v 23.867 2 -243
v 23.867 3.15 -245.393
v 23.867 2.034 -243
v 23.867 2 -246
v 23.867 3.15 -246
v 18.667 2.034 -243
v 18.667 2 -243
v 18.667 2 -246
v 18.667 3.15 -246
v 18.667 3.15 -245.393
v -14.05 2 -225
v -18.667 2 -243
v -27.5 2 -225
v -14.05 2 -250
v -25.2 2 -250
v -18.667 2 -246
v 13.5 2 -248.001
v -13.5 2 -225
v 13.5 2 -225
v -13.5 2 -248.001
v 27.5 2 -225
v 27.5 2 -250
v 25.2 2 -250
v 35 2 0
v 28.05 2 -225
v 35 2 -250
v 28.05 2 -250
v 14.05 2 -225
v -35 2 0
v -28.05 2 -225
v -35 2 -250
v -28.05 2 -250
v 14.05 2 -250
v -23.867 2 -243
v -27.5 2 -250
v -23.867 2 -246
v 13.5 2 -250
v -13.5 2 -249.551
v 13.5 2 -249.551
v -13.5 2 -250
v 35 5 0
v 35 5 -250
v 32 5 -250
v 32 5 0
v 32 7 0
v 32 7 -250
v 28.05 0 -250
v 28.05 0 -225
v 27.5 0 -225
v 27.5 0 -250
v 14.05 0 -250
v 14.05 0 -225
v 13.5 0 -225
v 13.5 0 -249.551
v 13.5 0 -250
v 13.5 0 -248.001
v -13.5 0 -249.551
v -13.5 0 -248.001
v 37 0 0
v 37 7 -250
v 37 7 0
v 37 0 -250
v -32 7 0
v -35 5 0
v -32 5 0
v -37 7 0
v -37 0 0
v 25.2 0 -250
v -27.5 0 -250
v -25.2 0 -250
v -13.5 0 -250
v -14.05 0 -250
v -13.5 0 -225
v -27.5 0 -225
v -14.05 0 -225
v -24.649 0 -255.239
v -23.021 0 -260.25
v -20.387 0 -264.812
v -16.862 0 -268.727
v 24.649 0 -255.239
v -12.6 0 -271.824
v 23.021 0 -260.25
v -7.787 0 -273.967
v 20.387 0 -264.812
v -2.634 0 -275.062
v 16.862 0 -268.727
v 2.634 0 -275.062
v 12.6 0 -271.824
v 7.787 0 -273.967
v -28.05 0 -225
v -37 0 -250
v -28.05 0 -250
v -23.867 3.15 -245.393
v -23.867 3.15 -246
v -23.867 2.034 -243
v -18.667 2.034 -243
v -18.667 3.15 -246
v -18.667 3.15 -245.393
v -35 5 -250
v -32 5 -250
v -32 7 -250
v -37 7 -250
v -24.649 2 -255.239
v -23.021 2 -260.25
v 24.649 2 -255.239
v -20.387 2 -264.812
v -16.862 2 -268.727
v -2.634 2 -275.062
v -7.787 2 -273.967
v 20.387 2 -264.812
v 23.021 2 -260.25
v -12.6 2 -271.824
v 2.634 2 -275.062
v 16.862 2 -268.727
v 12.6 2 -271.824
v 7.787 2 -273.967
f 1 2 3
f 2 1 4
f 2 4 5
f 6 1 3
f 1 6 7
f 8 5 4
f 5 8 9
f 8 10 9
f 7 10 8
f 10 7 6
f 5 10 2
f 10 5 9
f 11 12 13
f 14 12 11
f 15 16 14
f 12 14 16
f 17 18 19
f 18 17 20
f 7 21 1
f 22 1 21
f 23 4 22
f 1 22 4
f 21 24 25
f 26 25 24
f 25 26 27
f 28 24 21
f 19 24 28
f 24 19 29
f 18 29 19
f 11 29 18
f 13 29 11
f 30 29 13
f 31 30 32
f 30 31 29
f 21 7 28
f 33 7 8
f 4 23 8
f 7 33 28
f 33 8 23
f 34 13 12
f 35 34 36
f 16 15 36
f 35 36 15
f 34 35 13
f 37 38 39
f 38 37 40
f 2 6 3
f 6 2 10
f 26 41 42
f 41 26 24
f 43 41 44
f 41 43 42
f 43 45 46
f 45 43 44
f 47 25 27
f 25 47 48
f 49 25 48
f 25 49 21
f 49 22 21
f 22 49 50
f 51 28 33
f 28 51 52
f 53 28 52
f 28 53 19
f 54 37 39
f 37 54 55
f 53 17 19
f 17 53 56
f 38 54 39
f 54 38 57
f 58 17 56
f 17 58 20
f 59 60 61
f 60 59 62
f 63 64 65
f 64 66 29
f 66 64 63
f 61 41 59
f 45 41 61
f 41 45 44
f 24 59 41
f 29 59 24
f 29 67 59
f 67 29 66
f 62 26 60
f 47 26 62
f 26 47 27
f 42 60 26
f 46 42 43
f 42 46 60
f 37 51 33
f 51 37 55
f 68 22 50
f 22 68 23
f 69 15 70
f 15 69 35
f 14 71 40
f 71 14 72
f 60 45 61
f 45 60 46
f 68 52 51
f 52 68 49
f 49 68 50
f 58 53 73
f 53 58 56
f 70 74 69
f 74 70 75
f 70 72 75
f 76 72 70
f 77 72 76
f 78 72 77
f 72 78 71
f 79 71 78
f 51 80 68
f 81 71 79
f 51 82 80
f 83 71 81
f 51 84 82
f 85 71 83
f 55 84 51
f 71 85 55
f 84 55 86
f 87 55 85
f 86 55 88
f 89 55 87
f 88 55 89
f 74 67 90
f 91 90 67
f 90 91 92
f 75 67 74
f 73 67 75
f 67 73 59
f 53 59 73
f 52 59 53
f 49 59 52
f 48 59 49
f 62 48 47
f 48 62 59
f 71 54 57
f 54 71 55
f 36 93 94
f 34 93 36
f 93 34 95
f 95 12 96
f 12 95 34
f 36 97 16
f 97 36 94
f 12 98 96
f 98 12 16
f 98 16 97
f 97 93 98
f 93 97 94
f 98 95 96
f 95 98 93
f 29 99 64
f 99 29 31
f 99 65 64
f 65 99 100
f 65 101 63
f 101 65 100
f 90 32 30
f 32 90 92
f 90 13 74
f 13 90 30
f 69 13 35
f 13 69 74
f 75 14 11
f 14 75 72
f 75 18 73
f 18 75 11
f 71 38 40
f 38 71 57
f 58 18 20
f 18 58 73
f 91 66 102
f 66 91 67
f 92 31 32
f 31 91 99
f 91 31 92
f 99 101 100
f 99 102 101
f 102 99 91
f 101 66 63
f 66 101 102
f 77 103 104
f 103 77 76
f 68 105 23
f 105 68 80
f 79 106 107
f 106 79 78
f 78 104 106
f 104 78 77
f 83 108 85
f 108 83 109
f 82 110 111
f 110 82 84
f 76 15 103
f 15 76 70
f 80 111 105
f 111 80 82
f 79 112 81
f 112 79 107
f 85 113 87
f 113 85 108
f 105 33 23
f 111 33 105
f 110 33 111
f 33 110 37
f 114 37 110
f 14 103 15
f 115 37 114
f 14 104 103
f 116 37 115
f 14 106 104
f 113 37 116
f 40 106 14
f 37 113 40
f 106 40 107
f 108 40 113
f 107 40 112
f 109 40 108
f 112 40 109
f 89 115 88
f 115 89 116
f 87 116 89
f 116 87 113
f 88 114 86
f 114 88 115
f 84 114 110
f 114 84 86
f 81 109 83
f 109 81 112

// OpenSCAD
use <shortcuts.scad>


// preview[view:northwest, tilt:bottomdiagonal]

/* [holder chinese laser] */



*holder(t=3, clf_partHeight=30, clf_innerWidth = 70);
holder(t=1, clf_partHeight=250, clf_innerWidth = 70);


module holder(t=1,
// min width of the plastic walls.
clf_wall = 2, // plastic walls are 2mm

// we will model the whole thing based on the hole in the middle, since that is all we care about. It should be the measured from the male part on the bie light you want to attach here.
clf_innerWidth = 17.21, // the side to side of the shaft
clf_innerDepth = 3, // the depth the shaft
// height does not matter much for the male part, as it will pass trhu the whole part. So just enter a good height so that it reaches the latch on the bottom.
clf_partHeight = 22.75,
) 
{

// width of the thumb thing for the latch
clf_handle_width = clf_innerWidth*0.8;

if(t==1) clf_main();

if(t==2) holder2();

if(t==3) holder3();
	
module holder2() {
	r=0.1;
	difference() {
		w=clf_innerWidth+clf_wall*2-0.01;
		translate([-w/2,clf_wall-0.01+r,-(clf_partHeight+6.5+0.01)])
			cube([w, clf_innerDepth+clf_wall*2,clf_partHeight+6.5]);
		minkowski() {
			clf_main();
			sphere(r=r);
		}
	}
}

module holder3() {
	r=0.1;
	Tz(clf_partHeight/2) Ty(-(clf_wall+(clf_innerDepth+clf_wall*2)/2))
	difference() {
		w=clf_innerWidth+clf_wall*2-0.01;
		translate([-w/2,clf_wall-0.01+r,-(clf_partHeight+0.01)])
			cube([w, clf_innerDepth+clf_wall*2,clf_partHeight]);
		minkowski() {
			clf_main();
			sphere(r=r);
		}
	}
}

module main_part(){
	latch();
	difference(){
		// the main block where we will chip the pieces away
		cube([ clf_innerWidth/2 + clf_wall, clf_innerDepth+clf_wall*2 , clf_partHeight] );
		main_cuts();
	}
}
module latch(){
	// bottom latch
	*translate([ 0, 0, -clf_wall ] ){
		cube( [ clf_handle_width/2 -0.5, clf_wall, clf_wall] );
	}
	// the latching block
	translate([clf_handle_width/3 , clf_wall, clf_wall*2 ] ){
		difference() {
		cube( [ 5.20, 1.15, 3] );
		translate([ 0, 1.2, 0.5 ] )rotate([25,0,0])cube( [ 5.20, 1.15, 5] );
		}
	}
	// the lachking block base
	*translate([ 0, 0, -3-clf_wall ] ){
		cube( [ clf_handle_width/2, clf_wall, 3] );
	}
	//handle();
}
module handle(){
	// the handle
	translate([ 0, clf_wall, clf_wall-2 ] ){
		rotate([90, 0, 0]) I(){
			cylinder( h=clf_wall, r=clf_handle_width/2*0.9);
			Ty(-clf_handle_width/2) Tz(clf_wall/2) Cu(clf_handle_width, clf_handle_width,clf_wall+1);
		}
	}
}

module main_cuts(){
	// the inner shaft
	translate( [ -0.001, clf_wall, -0.001] ){
		cube([ clf_innerWidth/2+0.001, clf_innerDepth, clf_partHeight+0.002] );
	}
	// the front wall opening
	translate( [ -0.001, (clf_wall)+clf_innerDepth-0.001, -0.001] ){
		cube([ clf_innerWidth/2-clf_innerDepth+0.001, clf_wall+0.002, clf_partHeight+0.002] );
	}
	// the two cuts on the side leading to the latch so that it can move back/forth
	translate( [ clf_handle_width/2-0.5, -0.001, -0.001] ){
		cube([ 0.55, clf_wall+0.002, clf_partHeight/10+0.001]);
	}
	// the two cuts on the side leading to the latch so that it can move back/forth
	translate( [ clf_handle_width/4-0.5, -0.001, -0.001] ){
		cube([ 0.55, clf_wall+0.002, clf_partHeight/10+0.001]);
	}
	// the two cuts on the side leading to the latch so that it can move back/forth
	 translate( [ 0, -0.001, 2-0.001] ){
		 Ry(90)cube([1.55, clf_wall+0.002, clf_handle_width/4+0.001]);
	}
}

module clf_main(){
	translate([0,0,-clf_partHeight]){
		main_part();
		actual_mirror();
		handle();
	}
}

// mirror the geometry... why the fuck mirror does not copy? that way it is just an alias to rotate()
module actual_mirror(){
	mirror([10,0,0]){
		main_part();
	}
}

}
